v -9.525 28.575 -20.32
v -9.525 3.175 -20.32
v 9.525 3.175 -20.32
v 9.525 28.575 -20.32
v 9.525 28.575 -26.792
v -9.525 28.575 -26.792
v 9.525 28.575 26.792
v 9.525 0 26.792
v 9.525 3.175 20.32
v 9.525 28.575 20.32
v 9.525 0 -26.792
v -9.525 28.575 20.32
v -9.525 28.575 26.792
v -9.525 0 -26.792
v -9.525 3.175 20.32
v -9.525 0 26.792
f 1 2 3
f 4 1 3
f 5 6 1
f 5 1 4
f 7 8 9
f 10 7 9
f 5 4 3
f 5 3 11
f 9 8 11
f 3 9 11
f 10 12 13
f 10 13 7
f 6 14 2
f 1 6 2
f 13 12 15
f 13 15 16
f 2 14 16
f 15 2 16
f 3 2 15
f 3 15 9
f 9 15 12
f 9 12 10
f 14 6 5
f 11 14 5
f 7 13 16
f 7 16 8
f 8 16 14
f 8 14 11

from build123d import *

# Parameters (mm, degrees)
SKETCH1_W           = 19.05
SKETCH1_H           = 53.584105048
BOSS_EXTRUDE1_DEPTH = 3.175
SKETCH1_3_W         = 19.05
SKETCH1_3_H         = 6.472052524
BOSS_EXTRUDE2_DEPTH = 28.575


with BuildPart() as part:
    # Sketch1 → Boss-Extrude1 (new body)
    with BuildSketch(Plane(origin=(0, 0, 0), x_dir=(1, 0, 0), z_dir=(0, 1, 0))):
        Rectangle(SKETCH1_W, SKETCH1_H)
    extrude(amount=BOSS_EXTRUDE1_DEPTH)

    # Sketch1<3> → Boss-Extrude2 (add)
    with BuildSketch(Plane(origin=(0, 0, 0), x_dir=(1, 0, 0), z_dir=(0, 1, 0))):
        with Locations((0, 23.556026262)):
            Rectangle(SKETCH1_3_W, SKETCH1_3_H)
        with Locations((0, -23.556026262)):
            Rectangle(SKETCH1_3_W, SKETCH1_3_H)
    extrude(amount=BOSS_EXTRUDE2_DEPTH)


solid = part.part
